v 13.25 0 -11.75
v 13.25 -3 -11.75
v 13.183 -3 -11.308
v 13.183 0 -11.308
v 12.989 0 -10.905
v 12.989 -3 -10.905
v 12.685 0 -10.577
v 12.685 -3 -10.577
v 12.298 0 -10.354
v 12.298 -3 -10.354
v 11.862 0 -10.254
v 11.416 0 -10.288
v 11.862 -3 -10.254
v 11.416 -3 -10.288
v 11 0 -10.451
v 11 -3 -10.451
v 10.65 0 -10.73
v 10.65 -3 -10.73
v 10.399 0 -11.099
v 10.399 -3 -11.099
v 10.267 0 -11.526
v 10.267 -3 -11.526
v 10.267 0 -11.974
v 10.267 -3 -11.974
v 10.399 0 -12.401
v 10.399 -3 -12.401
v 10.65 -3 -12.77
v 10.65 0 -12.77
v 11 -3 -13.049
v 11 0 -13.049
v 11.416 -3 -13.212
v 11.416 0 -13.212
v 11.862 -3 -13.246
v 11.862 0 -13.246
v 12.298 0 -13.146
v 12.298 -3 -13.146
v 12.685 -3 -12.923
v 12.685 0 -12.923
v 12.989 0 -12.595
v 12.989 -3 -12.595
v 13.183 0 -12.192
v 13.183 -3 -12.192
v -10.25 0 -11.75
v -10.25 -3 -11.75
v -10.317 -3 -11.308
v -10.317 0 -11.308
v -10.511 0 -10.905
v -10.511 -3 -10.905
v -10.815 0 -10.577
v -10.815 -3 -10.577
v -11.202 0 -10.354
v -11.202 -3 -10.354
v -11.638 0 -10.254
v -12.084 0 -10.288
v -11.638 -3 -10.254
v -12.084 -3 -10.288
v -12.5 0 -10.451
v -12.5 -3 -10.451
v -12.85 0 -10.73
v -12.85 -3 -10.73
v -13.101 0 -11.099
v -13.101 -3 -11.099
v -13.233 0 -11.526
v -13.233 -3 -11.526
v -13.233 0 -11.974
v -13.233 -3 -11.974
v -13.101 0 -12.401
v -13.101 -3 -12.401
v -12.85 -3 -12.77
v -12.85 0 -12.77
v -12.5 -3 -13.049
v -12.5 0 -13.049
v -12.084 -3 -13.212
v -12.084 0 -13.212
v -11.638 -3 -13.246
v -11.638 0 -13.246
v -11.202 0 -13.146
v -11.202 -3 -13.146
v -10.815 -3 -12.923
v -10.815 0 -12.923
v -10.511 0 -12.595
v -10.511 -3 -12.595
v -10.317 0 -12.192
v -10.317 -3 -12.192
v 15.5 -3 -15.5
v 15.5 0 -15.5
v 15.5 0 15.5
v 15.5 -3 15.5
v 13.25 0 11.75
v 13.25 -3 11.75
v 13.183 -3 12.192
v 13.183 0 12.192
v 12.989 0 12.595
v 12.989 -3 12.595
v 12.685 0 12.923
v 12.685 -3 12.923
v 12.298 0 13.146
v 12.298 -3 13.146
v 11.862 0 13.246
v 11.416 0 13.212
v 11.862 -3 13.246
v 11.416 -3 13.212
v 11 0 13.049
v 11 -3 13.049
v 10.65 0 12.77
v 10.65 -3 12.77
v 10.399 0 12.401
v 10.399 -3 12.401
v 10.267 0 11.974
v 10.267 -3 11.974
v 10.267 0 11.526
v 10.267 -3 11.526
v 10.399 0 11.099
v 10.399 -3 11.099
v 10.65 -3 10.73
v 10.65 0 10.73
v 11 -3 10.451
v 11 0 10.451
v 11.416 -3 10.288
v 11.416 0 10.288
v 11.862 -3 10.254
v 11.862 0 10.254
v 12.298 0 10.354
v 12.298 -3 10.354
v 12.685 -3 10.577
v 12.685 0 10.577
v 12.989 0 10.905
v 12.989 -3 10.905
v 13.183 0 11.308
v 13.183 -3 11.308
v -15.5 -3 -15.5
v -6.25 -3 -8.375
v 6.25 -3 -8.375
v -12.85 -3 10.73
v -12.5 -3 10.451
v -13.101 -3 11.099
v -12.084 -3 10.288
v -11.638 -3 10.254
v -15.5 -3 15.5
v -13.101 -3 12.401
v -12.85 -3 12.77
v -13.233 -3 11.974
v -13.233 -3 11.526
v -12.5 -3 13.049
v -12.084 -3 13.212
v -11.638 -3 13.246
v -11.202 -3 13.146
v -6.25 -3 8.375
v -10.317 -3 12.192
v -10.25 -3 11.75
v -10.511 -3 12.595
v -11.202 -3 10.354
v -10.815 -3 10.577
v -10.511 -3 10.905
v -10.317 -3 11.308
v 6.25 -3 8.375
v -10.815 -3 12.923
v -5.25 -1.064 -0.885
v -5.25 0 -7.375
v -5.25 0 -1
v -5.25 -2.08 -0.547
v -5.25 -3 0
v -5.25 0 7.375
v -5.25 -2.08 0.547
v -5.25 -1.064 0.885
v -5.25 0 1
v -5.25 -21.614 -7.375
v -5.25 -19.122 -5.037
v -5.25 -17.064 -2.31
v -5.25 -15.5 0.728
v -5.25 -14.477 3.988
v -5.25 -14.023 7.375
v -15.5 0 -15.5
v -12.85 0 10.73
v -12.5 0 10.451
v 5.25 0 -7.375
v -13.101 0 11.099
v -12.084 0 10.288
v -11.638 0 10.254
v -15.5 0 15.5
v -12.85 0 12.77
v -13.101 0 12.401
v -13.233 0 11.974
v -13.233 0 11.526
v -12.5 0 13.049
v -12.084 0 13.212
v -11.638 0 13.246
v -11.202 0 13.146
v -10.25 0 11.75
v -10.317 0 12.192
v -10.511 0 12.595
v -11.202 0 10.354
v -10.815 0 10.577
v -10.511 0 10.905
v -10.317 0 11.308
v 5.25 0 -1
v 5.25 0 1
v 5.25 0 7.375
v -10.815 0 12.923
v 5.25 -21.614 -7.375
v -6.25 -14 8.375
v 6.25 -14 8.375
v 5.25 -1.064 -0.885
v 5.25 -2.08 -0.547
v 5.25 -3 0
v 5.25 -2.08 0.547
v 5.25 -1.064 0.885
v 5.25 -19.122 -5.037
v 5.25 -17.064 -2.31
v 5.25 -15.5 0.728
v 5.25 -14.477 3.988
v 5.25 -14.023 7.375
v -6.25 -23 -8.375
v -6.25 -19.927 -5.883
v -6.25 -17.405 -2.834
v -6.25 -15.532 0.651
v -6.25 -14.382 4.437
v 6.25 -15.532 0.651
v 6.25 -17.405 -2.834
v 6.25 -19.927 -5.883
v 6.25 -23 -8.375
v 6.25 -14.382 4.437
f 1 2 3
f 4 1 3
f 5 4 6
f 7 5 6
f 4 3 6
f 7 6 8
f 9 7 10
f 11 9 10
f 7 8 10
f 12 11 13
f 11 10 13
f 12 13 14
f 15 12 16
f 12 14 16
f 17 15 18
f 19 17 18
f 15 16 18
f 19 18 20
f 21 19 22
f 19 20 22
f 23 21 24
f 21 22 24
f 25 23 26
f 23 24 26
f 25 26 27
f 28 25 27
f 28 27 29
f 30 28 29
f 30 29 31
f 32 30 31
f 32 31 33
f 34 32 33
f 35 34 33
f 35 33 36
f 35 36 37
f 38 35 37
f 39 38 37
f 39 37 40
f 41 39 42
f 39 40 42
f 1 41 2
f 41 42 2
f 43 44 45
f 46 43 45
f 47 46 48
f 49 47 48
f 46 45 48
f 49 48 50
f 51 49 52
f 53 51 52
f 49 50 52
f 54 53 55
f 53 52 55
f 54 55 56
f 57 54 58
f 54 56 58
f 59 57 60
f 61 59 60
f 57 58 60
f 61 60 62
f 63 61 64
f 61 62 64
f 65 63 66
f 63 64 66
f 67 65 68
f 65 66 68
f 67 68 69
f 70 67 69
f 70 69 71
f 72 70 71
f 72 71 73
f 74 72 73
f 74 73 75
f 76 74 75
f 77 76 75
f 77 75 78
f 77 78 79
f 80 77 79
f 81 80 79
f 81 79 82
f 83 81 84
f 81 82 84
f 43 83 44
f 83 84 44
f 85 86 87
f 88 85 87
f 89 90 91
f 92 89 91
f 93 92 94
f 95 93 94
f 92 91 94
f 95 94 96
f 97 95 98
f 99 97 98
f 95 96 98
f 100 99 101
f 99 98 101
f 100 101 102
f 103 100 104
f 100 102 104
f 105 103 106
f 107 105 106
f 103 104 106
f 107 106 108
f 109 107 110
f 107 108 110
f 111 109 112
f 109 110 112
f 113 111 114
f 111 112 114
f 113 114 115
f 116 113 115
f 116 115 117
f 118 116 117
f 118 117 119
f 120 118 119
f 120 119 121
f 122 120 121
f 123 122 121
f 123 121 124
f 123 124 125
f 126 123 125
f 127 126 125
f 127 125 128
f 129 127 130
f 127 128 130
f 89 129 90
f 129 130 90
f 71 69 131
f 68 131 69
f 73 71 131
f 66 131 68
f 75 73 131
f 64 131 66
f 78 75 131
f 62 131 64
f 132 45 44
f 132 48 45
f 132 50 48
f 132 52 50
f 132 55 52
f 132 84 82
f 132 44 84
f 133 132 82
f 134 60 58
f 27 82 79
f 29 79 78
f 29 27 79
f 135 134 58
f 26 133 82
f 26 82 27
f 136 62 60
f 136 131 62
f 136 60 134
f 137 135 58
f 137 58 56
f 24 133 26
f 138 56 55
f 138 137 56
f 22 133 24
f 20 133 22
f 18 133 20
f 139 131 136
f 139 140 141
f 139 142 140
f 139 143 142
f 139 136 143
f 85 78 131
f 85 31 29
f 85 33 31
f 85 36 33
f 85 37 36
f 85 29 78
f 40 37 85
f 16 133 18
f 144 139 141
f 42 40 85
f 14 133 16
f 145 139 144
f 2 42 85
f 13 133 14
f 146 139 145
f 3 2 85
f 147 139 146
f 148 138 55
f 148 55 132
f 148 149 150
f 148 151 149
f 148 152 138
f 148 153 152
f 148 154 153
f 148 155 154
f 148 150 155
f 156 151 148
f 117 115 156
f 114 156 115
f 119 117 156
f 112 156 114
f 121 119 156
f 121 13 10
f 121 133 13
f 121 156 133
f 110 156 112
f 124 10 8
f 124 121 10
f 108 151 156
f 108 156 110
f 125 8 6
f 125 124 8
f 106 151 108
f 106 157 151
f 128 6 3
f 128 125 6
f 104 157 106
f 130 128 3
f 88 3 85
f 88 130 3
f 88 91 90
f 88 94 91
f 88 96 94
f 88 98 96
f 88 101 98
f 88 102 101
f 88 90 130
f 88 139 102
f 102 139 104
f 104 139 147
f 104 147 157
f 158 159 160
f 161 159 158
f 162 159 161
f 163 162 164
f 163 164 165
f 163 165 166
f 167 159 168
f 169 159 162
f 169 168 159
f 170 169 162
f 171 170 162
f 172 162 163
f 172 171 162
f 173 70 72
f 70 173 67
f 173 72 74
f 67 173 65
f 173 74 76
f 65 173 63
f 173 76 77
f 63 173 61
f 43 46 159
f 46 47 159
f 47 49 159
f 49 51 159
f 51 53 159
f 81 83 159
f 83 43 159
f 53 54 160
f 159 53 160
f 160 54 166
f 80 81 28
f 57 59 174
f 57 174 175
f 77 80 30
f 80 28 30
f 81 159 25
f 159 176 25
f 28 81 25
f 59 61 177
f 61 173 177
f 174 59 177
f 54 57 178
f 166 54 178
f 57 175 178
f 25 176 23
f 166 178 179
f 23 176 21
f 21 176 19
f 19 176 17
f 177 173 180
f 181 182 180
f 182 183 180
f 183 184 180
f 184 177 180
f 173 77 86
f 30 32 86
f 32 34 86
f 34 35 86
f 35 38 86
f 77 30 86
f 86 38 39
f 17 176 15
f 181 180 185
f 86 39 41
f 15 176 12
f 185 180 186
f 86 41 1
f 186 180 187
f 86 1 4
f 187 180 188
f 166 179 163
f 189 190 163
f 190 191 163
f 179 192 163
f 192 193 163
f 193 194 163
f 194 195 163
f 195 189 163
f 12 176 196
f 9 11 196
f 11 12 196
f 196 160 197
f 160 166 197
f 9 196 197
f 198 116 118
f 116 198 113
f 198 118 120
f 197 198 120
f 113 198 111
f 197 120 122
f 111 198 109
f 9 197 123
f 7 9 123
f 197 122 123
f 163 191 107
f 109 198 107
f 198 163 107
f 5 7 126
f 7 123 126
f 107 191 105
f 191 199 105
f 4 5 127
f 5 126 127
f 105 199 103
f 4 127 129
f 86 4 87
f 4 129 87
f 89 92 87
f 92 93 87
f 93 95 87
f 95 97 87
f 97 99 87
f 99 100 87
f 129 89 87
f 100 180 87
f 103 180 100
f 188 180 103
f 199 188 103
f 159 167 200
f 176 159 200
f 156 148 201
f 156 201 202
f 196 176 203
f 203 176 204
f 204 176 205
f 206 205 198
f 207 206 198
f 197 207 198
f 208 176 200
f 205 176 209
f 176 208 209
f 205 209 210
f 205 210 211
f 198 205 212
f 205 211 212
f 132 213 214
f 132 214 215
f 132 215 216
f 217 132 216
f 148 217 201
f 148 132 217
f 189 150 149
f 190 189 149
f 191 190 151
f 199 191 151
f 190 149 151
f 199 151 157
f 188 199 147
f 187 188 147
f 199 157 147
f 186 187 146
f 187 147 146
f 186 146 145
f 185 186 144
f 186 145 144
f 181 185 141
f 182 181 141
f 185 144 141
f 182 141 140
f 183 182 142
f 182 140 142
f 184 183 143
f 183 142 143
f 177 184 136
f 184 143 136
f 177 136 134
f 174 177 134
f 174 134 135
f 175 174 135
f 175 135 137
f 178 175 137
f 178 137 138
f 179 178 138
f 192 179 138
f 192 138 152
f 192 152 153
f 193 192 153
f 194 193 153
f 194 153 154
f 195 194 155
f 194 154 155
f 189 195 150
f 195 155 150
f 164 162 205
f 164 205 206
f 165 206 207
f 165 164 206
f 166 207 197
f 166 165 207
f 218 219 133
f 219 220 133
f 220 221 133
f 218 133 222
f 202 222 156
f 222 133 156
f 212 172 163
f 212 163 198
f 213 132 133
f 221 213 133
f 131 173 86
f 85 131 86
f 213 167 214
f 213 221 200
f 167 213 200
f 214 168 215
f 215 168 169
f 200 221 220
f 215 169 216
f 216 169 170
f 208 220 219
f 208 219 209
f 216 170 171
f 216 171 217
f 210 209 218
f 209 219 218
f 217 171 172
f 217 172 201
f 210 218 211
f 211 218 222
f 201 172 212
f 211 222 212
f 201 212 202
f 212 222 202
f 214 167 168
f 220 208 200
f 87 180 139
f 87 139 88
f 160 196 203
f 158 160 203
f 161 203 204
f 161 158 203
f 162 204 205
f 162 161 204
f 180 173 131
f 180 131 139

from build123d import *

# Parameters (mm, degrees)
F0_W         = 31
F0_H         = 31
F1_DEPTH     = 3
F2_R         = 1.5
F3_DEPTH     = 3
F4_W         = 12.5
F4_H         = 16.75
F5_DEPTH     = 20
F6_W         = 10.5
F6_H         = 14.75
F7_DEPTH     = 23
F8_R         = 20
F9_DEPTH     = 25
F10_W        = 12.5
F10_H        = 1
F11_DEPTH    = 3
F12_T1_DEPTH = 10.5
F13_W        = 12.5
F13_H        = 1
F14_DEPTH    = 3
F15_T1_DEPTH = 10.5


# Not quite as in the source:
# - a fillet or chamfer that OpenCascade refuses, or shapes differently, is made with other operations: its cross-section is extruded or revolved along the edge and cut away or added


with BuildPart() as f1:
    # F0 (on Front) → F1 (new body)
    with BuildSketch(Plane.XZ):
        Rectangle(F0_W, F0_H)
    extrude(amount=F1_DEPTH)

    # F2 (on face) → F3 (cut)
    with BuildSketch(Plane.XZ.offset(3)):
        with Locations((-11.75, -11.75)):
            Circle(F2_R)
        with Locations((-11.75, 11.75)):
            Circle(F2_R)
        with Locations((11.75, 11.75)):
            Circle(F2_R)
        with Locations((11.75, -11.75)):
            Circle(F2_R)
    extrude(amount=-F3_DEPTH, mode=Mode.SUBTRACT)

    # F4 (on face) → F5 (join)
    with BuildSketch(Plane.XZ.offset(3)):
        Rectangle(F4_W, F4_H)
    extrude(amount=F5_DEPTH)

    # F6 (on face) → F7 (cut)
    with BuildSketch(Plane.XZ.offset(23)):
        Rectangle(F6_W, F6_H)
    extrude(amount=-F7_DEPTH, mode=Mode.SUBTRACT)

    # F8 (on face) → F9 (cut)
    with BuildSketch(Plane.YZ.offset(6.25)):
        with Locations((-34, 8.3282930885)):
            Circle(F8_R)
    extrude(amount=-F9_DEPTH, mode=Mode.SUBTRACT)

    # F10 (on face) → F11 (join)
    with BuildSketch(Plane.XZ.offset(3)):
        with Locations((0, -0.5)):
            Rectangle(F10_W, F10_H)
    extrude(amount=-F11_DEPTH)

    # F12: fillet of radius 5 on 1 edges, made by hand

    # F12_s2 → F12_t1 (cut)
    with BuildSketch(Plane.YZ.offset(-5.25)):
        with BuildLine():
            ThreePointArc((0, -1), (-1.5811388301, -0.7434164903), (-3, 0))
            Line((-3, 0), (-3, -1))
            Line((-3, -1), (0, -1))
        make_face()
    extrude(amount=F12_T1_DEPTH, mode=Mode.SUBTRACT)

    # F13 (on face) → F14 (join)
    with BuildSketch(Plane.XZ.offset(3)):
        with Locations((0, 0.5)):
            Rectangle(F13_W, F13_H)
    extrude(amount=-F14_DEPTH)

    # F15: fillet of radius 5 on 1 edges, made by hand

    # F15_s2 → F15_t1 (cut)
    with BuildSketch(Plane.YZ.offset(-5.25)):
        with BuildLine():
            ThreePointArc((-3, 0), (-1.5811388301, 0.7434164903), (0, 1))
            Line((0, 1), (-3, 1))
            Line((-3, 1), (-3, 0))
        make_face()
    extrude(amount=F15_T1_DEPTH, mode=Mode.SUBTRACT)


solid = f1.part
